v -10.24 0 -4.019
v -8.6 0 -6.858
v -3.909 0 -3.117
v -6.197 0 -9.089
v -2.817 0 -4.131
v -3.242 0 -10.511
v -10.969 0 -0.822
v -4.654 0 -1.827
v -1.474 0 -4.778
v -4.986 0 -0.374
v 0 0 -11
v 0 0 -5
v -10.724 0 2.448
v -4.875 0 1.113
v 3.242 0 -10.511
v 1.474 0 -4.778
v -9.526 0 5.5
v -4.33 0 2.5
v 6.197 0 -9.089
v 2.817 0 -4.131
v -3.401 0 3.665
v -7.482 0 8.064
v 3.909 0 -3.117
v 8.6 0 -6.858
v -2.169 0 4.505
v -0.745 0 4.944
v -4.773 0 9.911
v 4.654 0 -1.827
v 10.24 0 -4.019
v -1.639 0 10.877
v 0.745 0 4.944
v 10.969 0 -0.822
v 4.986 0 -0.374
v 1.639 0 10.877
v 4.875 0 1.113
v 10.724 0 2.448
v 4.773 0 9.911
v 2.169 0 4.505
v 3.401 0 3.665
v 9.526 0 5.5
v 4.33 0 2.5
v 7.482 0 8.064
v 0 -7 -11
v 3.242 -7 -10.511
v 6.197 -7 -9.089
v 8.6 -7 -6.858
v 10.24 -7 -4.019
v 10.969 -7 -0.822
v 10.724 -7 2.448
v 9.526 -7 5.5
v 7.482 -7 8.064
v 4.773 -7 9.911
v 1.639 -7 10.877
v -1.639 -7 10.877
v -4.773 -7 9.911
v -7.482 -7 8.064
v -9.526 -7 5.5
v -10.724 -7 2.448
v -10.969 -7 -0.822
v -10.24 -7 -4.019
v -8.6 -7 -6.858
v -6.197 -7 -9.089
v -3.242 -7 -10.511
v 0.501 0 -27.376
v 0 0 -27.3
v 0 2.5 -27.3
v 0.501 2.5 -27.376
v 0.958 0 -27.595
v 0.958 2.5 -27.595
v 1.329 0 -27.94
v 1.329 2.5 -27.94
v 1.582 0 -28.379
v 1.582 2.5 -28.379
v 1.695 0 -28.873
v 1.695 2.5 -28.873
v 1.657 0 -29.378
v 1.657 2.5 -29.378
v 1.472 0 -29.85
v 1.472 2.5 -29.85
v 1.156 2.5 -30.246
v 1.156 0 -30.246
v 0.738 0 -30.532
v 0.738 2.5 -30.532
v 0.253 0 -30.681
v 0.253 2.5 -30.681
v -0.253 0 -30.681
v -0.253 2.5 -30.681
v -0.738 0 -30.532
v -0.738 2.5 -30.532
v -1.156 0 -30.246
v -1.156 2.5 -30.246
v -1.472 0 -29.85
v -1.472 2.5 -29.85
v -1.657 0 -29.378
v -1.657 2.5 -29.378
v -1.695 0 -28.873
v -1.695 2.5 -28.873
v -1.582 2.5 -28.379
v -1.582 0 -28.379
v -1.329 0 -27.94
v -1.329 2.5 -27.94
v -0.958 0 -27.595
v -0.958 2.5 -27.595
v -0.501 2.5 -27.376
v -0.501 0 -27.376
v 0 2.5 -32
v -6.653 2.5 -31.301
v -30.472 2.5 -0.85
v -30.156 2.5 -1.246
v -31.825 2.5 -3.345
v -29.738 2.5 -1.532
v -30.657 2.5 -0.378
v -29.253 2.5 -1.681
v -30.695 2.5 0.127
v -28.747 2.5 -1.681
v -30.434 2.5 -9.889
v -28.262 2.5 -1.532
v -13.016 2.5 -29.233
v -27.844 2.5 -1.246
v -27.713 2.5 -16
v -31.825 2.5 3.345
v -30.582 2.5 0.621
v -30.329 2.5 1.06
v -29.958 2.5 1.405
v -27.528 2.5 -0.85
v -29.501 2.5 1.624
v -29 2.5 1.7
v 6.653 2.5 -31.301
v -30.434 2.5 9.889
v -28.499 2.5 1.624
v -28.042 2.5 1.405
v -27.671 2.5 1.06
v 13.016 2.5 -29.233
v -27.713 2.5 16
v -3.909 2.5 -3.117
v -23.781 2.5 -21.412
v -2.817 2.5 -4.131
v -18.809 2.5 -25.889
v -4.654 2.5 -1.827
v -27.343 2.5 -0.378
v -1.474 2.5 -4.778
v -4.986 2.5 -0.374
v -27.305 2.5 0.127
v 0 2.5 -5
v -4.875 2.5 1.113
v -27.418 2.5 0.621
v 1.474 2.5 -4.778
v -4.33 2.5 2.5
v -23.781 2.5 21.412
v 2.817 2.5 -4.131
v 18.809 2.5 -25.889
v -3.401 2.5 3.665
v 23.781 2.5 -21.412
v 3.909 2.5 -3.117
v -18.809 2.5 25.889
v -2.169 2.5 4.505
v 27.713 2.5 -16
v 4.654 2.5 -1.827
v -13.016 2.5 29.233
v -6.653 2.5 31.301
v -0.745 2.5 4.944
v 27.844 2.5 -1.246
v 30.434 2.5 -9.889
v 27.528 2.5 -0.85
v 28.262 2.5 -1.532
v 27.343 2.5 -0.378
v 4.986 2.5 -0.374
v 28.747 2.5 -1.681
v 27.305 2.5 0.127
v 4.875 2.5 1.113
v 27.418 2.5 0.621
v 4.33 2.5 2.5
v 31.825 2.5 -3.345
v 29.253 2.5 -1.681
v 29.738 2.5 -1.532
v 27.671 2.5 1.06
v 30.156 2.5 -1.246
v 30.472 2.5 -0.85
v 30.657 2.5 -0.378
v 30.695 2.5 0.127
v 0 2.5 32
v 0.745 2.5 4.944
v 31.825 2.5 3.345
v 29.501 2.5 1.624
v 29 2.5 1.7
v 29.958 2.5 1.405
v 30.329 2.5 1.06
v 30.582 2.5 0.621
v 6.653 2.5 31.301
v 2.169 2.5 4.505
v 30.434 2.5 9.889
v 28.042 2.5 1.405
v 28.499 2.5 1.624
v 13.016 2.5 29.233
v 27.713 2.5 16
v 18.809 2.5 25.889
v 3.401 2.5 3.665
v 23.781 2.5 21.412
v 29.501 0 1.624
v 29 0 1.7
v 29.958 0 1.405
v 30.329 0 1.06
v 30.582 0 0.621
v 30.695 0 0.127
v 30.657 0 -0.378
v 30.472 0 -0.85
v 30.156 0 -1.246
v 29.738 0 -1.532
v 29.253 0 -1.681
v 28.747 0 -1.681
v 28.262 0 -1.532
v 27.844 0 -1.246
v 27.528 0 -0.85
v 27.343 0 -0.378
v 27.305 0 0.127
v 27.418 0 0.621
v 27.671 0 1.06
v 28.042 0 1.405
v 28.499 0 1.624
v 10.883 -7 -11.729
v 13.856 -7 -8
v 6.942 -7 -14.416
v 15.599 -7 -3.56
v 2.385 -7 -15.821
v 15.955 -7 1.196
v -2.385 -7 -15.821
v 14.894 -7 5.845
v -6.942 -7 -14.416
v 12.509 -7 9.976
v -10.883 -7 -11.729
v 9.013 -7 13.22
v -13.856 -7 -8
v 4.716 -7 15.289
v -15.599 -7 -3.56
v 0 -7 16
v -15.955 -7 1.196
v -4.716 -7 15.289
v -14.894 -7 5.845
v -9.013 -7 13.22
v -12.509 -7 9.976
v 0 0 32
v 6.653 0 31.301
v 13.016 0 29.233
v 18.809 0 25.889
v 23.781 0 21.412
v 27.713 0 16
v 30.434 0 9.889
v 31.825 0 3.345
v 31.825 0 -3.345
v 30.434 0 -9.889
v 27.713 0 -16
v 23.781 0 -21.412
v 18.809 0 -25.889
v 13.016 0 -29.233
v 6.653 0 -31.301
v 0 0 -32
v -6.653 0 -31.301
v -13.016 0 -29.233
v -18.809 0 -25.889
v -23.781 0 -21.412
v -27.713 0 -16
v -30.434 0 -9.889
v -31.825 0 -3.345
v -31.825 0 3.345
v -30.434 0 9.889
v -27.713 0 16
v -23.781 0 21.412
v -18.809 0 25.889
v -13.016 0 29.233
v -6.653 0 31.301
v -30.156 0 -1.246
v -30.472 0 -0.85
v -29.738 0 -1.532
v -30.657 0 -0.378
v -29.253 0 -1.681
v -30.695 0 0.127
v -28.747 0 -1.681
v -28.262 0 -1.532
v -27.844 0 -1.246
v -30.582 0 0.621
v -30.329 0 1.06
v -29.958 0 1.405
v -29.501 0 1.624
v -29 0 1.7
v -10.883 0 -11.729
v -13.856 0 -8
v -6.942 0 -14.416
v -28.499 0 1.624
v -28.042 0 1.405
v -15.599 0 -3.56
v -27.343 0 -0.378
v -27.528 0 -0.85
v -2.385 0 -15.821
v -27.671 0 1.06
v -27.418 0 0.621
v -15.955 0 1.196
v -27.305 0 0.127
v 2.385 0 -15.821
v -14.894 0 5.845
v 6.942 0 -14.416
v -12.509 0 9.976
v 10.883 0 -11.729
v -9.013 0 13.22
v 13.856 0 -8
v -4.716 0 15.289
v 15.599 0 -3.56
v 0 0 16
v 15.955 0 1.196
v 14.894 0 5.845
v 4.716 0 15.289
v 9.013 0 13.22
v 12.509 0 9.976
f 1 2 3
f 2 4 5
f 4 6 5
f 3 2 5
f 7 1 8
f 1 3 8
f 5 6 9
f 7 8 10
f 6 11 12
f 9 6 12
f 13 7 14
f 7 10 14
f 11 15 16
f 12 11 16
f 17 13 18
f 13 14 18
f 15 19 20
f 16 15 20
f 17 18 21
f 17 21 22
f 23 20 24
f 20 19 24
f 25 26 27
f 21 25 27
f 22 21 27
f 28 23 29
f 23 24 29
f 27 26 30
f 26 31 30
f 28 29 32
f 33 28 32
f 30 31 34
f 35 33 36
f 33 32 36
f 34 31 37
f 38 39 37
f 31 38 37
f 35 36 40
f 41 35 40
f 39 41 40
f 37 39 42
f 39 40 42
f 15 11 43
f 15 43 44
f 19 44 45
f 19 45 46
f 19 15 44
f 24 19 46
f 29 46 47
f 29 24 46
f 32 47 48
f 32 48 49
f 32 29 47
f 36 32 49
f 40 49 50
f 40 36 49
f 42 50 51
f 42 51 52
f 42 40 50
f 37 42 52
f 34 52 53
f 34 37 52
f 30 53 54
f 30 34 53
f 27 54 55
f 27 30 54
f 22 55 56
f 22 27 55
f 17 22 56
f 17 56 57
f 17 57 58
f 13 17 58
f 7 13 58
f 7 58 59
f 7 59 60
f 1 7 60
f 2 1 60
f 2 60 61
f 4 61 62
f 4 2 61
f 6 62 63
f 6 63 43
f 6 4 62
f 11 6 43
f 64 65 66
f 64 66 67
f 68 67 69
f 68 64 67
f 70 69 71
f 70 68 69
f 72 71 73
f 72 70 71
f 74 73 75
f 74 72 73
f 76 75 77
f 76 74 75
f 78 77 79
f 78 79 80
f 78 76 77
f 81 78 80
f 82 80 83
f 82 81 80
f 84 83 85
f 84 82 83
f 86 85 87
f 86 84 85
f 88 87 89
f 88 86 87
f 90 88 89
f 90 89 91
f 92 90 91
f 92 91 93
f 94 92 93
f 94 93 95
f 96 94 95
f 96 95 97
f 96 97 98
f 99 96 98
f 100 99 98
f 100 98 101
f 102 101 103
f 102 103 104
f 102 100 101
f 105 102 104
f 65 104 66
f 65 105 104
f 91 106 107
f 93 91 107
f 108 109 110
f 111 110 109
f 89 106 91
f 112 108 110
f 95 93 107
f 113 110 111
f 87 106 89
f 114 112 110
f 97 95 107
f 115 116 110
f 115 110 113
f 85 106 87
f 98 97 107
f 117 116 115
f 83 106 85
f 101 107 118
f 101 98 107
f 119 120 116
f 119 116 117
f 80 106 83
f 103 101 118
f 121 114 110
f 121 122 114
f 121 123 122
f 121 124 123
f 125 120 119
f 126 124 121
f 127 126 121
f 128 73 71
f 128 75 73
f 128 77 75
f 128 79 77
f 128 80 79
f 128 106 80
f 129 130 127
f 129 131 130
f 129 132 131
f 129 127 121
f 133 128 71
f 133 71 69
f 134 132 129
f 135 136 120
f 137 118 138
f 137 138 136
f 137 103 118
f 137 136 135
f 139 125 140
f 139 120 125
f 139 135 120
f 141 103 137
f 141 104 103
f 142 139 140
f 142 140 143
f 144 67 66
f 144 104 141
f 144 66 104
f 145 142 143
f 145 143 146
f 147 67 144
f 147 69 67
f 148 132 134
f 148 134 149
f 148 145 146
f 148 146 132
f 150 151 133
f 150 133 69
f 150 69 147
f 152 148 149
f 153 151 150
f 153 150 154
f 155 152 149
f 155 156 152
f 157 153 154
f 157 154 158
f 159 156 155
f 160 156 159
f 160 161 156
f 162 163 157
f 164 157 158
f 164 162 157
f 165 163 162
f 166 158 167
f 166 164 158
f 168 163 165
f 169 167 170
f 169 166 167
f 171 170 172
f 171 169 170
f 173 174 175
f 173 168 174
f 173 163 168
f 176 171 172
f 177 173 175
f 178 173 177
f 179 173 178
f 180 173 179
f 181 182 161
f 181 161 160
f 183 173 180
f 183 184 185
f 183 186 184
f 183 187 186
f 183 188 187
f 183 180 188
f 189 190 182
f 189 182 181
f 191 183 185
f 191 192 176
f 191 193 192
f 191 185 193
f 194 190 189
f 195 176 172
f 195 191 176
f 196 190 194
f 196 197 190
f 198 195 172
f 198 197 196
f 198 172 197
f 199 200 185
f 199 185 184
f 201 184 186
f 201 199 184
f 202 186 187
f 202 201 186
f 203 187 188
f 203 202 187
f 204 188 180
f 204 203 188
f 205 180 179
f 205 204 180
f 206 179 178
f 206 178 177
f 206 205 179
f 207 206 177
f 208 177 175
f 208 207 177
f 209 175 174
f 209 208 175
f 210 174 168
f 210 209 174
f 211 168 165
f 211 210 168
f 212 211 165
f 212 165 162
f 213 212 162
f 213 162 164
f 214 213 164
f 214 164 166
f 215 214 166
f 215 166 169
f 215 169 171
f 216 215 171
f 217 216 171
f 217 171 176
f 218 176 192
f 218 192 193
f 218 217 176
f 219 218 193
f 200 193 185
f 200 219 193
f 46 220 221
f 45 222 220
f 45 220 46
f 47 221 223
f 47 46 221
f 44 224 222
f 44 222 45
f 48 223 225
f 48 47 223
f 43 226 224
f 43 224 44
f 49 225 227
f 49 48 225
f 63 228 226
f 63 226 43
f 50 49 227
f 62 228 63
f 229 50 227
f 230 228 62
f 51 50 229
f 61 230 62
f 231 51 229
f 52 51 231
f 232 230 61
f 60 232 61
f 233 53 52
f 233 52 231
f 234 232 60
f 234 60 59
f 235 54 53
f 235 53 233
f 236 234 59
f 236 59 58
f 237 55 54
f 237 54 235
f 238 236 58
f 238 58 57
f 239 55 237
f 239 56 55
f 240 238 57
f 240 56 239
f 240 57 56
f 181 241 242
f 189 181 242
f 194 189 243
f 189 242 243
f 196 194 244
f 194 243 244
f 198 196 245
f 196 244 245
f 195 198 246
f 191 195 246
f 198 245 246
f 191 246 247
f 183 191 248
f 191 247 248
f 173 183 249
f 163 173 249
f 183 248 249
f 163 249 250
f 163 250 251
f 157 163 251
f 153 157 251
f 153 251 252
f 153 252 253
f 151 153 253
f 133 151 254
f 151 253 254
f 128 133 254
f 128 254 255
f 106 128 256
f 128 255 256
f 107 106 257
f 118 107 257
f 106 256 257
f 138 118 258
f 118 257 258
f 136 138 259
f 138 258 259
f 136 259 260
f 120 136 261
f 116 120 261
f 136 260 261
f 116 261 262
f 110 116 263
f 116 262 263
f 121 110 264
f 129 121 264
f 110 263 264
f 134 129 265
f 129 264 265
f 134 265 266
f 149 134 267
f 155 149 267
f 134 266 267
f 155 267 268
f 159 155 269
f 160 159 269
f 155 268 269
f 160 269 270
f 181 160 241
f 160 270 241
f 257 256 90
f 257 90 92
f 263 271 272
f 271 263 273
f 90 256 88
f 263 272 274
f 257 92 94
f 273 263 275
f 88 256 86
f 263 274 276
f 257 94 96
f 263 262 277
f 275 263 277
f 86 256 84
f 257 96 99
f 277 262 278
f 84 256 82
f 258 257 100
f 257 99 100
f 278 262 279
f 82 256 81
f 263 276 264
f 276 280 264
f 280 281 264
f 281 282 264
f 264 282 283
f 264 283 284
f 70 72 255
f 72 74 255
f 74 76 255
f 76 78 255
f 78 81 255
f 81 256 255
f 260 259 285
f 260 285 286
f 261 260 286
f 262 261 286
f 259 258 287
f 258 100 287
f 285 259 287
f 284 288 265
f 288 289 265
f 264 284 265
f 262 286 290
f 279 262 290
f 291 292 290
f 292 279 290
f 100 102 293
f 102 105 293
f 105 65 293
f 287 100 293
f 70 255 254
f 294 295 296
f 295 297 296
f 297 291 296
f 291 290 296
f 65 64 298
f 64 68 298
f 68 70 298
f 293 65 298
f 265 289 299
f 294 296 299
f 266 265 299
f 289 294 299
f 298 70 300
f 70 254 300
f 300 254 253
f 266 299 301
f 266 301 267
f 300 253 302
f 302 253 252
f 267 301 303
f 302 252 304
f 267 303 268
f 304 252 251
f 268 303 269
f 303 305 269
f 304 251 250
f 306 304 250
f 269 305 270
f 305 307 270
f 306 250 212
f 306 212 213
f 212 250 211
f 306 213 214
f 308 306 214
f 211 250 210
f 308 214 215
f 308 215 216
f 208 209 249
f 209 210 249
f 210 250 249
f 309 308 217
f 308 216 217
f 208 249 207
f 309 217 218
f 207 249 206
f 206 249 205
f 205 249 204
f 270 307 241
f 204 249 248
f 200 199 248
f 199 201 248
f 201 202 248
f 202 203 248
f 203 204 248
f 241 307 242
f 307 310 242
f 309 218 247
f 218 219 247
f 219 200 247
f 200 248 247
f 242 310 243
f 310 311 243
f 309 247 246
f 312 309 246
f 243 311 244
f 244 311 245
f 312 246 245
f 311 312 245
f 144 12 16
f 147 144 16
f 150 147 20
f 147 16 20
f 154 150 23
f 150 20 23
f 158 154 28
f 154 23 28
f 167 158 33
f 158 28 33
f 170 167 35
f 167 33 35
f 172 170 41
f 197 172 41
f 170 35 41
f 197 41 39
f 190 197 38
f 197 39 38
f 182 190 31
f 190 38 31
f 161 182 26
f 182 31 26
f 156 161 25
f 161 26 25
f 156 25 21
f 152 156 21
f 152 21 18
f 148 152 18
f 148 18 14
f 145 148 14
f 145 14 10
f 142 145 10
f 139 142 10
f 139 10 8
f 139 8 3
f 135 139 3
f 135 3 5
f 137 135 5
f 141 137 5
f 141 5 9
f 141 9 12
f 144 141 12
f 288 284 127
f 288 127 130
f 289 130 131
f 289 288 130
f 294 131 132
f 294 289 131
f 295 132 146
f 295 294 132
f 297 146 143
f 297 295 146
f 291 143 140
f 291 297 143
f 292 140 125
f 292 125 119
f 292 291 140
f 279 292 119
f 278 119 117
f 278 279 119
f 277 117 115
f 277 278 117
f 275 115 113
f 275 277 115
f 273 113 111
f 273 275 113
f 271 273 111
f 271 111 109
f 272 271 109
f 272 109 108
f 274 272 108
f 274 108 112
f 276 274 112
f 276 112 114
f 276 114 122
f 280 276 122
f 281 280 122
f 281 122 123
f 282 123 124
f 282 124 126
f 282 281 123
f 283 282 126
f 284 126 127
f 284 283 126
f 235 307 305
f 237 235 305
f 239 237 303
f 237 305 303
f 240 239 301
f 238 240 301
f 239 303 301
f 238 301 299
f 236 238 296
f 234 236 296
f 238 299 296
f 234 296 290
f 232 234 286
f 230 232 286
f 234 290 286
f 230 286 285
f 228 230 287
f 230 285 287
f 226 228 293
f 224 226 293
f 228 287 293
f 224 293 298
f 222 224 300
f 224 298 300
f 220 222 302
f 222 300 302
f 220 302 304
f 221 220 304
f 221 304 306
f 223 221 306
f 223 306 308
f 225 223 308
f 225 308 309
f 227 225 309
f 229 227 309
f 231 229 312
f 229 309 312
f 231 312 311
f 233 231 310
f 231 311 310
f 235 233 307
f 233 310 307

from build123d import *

# Parameters (mm, degrees)
CROQUIS1_R              = 32
CROQUIS1_R_2            = 1.7
SALIENTE_EXTRUIR1_DEPTH = 2.5
CROQUIS2_R              = 16
CROQUIS2_R_2            = 11
SALIENTE_EXTRUIR2_DEPTH = 7
CROQUIS3_R              = 5
CORTAR_EXTRUIR1_DEPTH   = 7


with BuildPart() as part:
    # Croquis1 → Saliente-Extruir1 (new body)
    with BuildSketch(Plane(origin=(0, 0, 0), x_dir=(1, 0, 0), z_dir=(0, 1, 0))):
        with Locations(Location((0, 0, 0), (0, 0, 270))):
            Circle(CROQUIS1_R)
        with Locations(Location((29, 0, 0), (0, 0, 270))):
            Circle(CROQUIS1_R_2, mode=Mode.SUBTRACT)
        with Locations(Location((-29, 0, 0), (0, 0, 270))):
            Circle(CROQUIS1_R_2, mode=Mode.SUBTRACT)
        with Locations(Location((0, 29, 0), (0, 0, 270))):
            Circle(CROQUIS1_R_2, mode=Mode.SUBTRACT)
    extrude(amount=SALIENTE_EXTRUIR1_DEPTH)

    # Croquis2 → Saliente-Extruir2 (add)
    with BuildSketch(Plane.XZ):
        with Locations(Location((0, 0, 0), (0, 0, 90))):
            Circle(CROQUIS2_R)
        with Locations(Location((0, 0, 0), (0, 0, 270))):
            Circle(CROQUIS2_R_2, mode=Mode.SUBTRACT)
    extrude(amount=SALIENTE_EXTRUIR2_DEPTH)

    # Croquis3 → Cortar-Extruir1 (cut)
    with BuildSketch(Plane.XZ):
        with Locations(Location((0, 0, 0), (0, 0, 270))):
            Circle(CROQUIS3_R)
    extrude(amount=-CORTAR_EXTRUIR1_DEPTH, mode=Mode.SUBTRACT)


solid = part.part
